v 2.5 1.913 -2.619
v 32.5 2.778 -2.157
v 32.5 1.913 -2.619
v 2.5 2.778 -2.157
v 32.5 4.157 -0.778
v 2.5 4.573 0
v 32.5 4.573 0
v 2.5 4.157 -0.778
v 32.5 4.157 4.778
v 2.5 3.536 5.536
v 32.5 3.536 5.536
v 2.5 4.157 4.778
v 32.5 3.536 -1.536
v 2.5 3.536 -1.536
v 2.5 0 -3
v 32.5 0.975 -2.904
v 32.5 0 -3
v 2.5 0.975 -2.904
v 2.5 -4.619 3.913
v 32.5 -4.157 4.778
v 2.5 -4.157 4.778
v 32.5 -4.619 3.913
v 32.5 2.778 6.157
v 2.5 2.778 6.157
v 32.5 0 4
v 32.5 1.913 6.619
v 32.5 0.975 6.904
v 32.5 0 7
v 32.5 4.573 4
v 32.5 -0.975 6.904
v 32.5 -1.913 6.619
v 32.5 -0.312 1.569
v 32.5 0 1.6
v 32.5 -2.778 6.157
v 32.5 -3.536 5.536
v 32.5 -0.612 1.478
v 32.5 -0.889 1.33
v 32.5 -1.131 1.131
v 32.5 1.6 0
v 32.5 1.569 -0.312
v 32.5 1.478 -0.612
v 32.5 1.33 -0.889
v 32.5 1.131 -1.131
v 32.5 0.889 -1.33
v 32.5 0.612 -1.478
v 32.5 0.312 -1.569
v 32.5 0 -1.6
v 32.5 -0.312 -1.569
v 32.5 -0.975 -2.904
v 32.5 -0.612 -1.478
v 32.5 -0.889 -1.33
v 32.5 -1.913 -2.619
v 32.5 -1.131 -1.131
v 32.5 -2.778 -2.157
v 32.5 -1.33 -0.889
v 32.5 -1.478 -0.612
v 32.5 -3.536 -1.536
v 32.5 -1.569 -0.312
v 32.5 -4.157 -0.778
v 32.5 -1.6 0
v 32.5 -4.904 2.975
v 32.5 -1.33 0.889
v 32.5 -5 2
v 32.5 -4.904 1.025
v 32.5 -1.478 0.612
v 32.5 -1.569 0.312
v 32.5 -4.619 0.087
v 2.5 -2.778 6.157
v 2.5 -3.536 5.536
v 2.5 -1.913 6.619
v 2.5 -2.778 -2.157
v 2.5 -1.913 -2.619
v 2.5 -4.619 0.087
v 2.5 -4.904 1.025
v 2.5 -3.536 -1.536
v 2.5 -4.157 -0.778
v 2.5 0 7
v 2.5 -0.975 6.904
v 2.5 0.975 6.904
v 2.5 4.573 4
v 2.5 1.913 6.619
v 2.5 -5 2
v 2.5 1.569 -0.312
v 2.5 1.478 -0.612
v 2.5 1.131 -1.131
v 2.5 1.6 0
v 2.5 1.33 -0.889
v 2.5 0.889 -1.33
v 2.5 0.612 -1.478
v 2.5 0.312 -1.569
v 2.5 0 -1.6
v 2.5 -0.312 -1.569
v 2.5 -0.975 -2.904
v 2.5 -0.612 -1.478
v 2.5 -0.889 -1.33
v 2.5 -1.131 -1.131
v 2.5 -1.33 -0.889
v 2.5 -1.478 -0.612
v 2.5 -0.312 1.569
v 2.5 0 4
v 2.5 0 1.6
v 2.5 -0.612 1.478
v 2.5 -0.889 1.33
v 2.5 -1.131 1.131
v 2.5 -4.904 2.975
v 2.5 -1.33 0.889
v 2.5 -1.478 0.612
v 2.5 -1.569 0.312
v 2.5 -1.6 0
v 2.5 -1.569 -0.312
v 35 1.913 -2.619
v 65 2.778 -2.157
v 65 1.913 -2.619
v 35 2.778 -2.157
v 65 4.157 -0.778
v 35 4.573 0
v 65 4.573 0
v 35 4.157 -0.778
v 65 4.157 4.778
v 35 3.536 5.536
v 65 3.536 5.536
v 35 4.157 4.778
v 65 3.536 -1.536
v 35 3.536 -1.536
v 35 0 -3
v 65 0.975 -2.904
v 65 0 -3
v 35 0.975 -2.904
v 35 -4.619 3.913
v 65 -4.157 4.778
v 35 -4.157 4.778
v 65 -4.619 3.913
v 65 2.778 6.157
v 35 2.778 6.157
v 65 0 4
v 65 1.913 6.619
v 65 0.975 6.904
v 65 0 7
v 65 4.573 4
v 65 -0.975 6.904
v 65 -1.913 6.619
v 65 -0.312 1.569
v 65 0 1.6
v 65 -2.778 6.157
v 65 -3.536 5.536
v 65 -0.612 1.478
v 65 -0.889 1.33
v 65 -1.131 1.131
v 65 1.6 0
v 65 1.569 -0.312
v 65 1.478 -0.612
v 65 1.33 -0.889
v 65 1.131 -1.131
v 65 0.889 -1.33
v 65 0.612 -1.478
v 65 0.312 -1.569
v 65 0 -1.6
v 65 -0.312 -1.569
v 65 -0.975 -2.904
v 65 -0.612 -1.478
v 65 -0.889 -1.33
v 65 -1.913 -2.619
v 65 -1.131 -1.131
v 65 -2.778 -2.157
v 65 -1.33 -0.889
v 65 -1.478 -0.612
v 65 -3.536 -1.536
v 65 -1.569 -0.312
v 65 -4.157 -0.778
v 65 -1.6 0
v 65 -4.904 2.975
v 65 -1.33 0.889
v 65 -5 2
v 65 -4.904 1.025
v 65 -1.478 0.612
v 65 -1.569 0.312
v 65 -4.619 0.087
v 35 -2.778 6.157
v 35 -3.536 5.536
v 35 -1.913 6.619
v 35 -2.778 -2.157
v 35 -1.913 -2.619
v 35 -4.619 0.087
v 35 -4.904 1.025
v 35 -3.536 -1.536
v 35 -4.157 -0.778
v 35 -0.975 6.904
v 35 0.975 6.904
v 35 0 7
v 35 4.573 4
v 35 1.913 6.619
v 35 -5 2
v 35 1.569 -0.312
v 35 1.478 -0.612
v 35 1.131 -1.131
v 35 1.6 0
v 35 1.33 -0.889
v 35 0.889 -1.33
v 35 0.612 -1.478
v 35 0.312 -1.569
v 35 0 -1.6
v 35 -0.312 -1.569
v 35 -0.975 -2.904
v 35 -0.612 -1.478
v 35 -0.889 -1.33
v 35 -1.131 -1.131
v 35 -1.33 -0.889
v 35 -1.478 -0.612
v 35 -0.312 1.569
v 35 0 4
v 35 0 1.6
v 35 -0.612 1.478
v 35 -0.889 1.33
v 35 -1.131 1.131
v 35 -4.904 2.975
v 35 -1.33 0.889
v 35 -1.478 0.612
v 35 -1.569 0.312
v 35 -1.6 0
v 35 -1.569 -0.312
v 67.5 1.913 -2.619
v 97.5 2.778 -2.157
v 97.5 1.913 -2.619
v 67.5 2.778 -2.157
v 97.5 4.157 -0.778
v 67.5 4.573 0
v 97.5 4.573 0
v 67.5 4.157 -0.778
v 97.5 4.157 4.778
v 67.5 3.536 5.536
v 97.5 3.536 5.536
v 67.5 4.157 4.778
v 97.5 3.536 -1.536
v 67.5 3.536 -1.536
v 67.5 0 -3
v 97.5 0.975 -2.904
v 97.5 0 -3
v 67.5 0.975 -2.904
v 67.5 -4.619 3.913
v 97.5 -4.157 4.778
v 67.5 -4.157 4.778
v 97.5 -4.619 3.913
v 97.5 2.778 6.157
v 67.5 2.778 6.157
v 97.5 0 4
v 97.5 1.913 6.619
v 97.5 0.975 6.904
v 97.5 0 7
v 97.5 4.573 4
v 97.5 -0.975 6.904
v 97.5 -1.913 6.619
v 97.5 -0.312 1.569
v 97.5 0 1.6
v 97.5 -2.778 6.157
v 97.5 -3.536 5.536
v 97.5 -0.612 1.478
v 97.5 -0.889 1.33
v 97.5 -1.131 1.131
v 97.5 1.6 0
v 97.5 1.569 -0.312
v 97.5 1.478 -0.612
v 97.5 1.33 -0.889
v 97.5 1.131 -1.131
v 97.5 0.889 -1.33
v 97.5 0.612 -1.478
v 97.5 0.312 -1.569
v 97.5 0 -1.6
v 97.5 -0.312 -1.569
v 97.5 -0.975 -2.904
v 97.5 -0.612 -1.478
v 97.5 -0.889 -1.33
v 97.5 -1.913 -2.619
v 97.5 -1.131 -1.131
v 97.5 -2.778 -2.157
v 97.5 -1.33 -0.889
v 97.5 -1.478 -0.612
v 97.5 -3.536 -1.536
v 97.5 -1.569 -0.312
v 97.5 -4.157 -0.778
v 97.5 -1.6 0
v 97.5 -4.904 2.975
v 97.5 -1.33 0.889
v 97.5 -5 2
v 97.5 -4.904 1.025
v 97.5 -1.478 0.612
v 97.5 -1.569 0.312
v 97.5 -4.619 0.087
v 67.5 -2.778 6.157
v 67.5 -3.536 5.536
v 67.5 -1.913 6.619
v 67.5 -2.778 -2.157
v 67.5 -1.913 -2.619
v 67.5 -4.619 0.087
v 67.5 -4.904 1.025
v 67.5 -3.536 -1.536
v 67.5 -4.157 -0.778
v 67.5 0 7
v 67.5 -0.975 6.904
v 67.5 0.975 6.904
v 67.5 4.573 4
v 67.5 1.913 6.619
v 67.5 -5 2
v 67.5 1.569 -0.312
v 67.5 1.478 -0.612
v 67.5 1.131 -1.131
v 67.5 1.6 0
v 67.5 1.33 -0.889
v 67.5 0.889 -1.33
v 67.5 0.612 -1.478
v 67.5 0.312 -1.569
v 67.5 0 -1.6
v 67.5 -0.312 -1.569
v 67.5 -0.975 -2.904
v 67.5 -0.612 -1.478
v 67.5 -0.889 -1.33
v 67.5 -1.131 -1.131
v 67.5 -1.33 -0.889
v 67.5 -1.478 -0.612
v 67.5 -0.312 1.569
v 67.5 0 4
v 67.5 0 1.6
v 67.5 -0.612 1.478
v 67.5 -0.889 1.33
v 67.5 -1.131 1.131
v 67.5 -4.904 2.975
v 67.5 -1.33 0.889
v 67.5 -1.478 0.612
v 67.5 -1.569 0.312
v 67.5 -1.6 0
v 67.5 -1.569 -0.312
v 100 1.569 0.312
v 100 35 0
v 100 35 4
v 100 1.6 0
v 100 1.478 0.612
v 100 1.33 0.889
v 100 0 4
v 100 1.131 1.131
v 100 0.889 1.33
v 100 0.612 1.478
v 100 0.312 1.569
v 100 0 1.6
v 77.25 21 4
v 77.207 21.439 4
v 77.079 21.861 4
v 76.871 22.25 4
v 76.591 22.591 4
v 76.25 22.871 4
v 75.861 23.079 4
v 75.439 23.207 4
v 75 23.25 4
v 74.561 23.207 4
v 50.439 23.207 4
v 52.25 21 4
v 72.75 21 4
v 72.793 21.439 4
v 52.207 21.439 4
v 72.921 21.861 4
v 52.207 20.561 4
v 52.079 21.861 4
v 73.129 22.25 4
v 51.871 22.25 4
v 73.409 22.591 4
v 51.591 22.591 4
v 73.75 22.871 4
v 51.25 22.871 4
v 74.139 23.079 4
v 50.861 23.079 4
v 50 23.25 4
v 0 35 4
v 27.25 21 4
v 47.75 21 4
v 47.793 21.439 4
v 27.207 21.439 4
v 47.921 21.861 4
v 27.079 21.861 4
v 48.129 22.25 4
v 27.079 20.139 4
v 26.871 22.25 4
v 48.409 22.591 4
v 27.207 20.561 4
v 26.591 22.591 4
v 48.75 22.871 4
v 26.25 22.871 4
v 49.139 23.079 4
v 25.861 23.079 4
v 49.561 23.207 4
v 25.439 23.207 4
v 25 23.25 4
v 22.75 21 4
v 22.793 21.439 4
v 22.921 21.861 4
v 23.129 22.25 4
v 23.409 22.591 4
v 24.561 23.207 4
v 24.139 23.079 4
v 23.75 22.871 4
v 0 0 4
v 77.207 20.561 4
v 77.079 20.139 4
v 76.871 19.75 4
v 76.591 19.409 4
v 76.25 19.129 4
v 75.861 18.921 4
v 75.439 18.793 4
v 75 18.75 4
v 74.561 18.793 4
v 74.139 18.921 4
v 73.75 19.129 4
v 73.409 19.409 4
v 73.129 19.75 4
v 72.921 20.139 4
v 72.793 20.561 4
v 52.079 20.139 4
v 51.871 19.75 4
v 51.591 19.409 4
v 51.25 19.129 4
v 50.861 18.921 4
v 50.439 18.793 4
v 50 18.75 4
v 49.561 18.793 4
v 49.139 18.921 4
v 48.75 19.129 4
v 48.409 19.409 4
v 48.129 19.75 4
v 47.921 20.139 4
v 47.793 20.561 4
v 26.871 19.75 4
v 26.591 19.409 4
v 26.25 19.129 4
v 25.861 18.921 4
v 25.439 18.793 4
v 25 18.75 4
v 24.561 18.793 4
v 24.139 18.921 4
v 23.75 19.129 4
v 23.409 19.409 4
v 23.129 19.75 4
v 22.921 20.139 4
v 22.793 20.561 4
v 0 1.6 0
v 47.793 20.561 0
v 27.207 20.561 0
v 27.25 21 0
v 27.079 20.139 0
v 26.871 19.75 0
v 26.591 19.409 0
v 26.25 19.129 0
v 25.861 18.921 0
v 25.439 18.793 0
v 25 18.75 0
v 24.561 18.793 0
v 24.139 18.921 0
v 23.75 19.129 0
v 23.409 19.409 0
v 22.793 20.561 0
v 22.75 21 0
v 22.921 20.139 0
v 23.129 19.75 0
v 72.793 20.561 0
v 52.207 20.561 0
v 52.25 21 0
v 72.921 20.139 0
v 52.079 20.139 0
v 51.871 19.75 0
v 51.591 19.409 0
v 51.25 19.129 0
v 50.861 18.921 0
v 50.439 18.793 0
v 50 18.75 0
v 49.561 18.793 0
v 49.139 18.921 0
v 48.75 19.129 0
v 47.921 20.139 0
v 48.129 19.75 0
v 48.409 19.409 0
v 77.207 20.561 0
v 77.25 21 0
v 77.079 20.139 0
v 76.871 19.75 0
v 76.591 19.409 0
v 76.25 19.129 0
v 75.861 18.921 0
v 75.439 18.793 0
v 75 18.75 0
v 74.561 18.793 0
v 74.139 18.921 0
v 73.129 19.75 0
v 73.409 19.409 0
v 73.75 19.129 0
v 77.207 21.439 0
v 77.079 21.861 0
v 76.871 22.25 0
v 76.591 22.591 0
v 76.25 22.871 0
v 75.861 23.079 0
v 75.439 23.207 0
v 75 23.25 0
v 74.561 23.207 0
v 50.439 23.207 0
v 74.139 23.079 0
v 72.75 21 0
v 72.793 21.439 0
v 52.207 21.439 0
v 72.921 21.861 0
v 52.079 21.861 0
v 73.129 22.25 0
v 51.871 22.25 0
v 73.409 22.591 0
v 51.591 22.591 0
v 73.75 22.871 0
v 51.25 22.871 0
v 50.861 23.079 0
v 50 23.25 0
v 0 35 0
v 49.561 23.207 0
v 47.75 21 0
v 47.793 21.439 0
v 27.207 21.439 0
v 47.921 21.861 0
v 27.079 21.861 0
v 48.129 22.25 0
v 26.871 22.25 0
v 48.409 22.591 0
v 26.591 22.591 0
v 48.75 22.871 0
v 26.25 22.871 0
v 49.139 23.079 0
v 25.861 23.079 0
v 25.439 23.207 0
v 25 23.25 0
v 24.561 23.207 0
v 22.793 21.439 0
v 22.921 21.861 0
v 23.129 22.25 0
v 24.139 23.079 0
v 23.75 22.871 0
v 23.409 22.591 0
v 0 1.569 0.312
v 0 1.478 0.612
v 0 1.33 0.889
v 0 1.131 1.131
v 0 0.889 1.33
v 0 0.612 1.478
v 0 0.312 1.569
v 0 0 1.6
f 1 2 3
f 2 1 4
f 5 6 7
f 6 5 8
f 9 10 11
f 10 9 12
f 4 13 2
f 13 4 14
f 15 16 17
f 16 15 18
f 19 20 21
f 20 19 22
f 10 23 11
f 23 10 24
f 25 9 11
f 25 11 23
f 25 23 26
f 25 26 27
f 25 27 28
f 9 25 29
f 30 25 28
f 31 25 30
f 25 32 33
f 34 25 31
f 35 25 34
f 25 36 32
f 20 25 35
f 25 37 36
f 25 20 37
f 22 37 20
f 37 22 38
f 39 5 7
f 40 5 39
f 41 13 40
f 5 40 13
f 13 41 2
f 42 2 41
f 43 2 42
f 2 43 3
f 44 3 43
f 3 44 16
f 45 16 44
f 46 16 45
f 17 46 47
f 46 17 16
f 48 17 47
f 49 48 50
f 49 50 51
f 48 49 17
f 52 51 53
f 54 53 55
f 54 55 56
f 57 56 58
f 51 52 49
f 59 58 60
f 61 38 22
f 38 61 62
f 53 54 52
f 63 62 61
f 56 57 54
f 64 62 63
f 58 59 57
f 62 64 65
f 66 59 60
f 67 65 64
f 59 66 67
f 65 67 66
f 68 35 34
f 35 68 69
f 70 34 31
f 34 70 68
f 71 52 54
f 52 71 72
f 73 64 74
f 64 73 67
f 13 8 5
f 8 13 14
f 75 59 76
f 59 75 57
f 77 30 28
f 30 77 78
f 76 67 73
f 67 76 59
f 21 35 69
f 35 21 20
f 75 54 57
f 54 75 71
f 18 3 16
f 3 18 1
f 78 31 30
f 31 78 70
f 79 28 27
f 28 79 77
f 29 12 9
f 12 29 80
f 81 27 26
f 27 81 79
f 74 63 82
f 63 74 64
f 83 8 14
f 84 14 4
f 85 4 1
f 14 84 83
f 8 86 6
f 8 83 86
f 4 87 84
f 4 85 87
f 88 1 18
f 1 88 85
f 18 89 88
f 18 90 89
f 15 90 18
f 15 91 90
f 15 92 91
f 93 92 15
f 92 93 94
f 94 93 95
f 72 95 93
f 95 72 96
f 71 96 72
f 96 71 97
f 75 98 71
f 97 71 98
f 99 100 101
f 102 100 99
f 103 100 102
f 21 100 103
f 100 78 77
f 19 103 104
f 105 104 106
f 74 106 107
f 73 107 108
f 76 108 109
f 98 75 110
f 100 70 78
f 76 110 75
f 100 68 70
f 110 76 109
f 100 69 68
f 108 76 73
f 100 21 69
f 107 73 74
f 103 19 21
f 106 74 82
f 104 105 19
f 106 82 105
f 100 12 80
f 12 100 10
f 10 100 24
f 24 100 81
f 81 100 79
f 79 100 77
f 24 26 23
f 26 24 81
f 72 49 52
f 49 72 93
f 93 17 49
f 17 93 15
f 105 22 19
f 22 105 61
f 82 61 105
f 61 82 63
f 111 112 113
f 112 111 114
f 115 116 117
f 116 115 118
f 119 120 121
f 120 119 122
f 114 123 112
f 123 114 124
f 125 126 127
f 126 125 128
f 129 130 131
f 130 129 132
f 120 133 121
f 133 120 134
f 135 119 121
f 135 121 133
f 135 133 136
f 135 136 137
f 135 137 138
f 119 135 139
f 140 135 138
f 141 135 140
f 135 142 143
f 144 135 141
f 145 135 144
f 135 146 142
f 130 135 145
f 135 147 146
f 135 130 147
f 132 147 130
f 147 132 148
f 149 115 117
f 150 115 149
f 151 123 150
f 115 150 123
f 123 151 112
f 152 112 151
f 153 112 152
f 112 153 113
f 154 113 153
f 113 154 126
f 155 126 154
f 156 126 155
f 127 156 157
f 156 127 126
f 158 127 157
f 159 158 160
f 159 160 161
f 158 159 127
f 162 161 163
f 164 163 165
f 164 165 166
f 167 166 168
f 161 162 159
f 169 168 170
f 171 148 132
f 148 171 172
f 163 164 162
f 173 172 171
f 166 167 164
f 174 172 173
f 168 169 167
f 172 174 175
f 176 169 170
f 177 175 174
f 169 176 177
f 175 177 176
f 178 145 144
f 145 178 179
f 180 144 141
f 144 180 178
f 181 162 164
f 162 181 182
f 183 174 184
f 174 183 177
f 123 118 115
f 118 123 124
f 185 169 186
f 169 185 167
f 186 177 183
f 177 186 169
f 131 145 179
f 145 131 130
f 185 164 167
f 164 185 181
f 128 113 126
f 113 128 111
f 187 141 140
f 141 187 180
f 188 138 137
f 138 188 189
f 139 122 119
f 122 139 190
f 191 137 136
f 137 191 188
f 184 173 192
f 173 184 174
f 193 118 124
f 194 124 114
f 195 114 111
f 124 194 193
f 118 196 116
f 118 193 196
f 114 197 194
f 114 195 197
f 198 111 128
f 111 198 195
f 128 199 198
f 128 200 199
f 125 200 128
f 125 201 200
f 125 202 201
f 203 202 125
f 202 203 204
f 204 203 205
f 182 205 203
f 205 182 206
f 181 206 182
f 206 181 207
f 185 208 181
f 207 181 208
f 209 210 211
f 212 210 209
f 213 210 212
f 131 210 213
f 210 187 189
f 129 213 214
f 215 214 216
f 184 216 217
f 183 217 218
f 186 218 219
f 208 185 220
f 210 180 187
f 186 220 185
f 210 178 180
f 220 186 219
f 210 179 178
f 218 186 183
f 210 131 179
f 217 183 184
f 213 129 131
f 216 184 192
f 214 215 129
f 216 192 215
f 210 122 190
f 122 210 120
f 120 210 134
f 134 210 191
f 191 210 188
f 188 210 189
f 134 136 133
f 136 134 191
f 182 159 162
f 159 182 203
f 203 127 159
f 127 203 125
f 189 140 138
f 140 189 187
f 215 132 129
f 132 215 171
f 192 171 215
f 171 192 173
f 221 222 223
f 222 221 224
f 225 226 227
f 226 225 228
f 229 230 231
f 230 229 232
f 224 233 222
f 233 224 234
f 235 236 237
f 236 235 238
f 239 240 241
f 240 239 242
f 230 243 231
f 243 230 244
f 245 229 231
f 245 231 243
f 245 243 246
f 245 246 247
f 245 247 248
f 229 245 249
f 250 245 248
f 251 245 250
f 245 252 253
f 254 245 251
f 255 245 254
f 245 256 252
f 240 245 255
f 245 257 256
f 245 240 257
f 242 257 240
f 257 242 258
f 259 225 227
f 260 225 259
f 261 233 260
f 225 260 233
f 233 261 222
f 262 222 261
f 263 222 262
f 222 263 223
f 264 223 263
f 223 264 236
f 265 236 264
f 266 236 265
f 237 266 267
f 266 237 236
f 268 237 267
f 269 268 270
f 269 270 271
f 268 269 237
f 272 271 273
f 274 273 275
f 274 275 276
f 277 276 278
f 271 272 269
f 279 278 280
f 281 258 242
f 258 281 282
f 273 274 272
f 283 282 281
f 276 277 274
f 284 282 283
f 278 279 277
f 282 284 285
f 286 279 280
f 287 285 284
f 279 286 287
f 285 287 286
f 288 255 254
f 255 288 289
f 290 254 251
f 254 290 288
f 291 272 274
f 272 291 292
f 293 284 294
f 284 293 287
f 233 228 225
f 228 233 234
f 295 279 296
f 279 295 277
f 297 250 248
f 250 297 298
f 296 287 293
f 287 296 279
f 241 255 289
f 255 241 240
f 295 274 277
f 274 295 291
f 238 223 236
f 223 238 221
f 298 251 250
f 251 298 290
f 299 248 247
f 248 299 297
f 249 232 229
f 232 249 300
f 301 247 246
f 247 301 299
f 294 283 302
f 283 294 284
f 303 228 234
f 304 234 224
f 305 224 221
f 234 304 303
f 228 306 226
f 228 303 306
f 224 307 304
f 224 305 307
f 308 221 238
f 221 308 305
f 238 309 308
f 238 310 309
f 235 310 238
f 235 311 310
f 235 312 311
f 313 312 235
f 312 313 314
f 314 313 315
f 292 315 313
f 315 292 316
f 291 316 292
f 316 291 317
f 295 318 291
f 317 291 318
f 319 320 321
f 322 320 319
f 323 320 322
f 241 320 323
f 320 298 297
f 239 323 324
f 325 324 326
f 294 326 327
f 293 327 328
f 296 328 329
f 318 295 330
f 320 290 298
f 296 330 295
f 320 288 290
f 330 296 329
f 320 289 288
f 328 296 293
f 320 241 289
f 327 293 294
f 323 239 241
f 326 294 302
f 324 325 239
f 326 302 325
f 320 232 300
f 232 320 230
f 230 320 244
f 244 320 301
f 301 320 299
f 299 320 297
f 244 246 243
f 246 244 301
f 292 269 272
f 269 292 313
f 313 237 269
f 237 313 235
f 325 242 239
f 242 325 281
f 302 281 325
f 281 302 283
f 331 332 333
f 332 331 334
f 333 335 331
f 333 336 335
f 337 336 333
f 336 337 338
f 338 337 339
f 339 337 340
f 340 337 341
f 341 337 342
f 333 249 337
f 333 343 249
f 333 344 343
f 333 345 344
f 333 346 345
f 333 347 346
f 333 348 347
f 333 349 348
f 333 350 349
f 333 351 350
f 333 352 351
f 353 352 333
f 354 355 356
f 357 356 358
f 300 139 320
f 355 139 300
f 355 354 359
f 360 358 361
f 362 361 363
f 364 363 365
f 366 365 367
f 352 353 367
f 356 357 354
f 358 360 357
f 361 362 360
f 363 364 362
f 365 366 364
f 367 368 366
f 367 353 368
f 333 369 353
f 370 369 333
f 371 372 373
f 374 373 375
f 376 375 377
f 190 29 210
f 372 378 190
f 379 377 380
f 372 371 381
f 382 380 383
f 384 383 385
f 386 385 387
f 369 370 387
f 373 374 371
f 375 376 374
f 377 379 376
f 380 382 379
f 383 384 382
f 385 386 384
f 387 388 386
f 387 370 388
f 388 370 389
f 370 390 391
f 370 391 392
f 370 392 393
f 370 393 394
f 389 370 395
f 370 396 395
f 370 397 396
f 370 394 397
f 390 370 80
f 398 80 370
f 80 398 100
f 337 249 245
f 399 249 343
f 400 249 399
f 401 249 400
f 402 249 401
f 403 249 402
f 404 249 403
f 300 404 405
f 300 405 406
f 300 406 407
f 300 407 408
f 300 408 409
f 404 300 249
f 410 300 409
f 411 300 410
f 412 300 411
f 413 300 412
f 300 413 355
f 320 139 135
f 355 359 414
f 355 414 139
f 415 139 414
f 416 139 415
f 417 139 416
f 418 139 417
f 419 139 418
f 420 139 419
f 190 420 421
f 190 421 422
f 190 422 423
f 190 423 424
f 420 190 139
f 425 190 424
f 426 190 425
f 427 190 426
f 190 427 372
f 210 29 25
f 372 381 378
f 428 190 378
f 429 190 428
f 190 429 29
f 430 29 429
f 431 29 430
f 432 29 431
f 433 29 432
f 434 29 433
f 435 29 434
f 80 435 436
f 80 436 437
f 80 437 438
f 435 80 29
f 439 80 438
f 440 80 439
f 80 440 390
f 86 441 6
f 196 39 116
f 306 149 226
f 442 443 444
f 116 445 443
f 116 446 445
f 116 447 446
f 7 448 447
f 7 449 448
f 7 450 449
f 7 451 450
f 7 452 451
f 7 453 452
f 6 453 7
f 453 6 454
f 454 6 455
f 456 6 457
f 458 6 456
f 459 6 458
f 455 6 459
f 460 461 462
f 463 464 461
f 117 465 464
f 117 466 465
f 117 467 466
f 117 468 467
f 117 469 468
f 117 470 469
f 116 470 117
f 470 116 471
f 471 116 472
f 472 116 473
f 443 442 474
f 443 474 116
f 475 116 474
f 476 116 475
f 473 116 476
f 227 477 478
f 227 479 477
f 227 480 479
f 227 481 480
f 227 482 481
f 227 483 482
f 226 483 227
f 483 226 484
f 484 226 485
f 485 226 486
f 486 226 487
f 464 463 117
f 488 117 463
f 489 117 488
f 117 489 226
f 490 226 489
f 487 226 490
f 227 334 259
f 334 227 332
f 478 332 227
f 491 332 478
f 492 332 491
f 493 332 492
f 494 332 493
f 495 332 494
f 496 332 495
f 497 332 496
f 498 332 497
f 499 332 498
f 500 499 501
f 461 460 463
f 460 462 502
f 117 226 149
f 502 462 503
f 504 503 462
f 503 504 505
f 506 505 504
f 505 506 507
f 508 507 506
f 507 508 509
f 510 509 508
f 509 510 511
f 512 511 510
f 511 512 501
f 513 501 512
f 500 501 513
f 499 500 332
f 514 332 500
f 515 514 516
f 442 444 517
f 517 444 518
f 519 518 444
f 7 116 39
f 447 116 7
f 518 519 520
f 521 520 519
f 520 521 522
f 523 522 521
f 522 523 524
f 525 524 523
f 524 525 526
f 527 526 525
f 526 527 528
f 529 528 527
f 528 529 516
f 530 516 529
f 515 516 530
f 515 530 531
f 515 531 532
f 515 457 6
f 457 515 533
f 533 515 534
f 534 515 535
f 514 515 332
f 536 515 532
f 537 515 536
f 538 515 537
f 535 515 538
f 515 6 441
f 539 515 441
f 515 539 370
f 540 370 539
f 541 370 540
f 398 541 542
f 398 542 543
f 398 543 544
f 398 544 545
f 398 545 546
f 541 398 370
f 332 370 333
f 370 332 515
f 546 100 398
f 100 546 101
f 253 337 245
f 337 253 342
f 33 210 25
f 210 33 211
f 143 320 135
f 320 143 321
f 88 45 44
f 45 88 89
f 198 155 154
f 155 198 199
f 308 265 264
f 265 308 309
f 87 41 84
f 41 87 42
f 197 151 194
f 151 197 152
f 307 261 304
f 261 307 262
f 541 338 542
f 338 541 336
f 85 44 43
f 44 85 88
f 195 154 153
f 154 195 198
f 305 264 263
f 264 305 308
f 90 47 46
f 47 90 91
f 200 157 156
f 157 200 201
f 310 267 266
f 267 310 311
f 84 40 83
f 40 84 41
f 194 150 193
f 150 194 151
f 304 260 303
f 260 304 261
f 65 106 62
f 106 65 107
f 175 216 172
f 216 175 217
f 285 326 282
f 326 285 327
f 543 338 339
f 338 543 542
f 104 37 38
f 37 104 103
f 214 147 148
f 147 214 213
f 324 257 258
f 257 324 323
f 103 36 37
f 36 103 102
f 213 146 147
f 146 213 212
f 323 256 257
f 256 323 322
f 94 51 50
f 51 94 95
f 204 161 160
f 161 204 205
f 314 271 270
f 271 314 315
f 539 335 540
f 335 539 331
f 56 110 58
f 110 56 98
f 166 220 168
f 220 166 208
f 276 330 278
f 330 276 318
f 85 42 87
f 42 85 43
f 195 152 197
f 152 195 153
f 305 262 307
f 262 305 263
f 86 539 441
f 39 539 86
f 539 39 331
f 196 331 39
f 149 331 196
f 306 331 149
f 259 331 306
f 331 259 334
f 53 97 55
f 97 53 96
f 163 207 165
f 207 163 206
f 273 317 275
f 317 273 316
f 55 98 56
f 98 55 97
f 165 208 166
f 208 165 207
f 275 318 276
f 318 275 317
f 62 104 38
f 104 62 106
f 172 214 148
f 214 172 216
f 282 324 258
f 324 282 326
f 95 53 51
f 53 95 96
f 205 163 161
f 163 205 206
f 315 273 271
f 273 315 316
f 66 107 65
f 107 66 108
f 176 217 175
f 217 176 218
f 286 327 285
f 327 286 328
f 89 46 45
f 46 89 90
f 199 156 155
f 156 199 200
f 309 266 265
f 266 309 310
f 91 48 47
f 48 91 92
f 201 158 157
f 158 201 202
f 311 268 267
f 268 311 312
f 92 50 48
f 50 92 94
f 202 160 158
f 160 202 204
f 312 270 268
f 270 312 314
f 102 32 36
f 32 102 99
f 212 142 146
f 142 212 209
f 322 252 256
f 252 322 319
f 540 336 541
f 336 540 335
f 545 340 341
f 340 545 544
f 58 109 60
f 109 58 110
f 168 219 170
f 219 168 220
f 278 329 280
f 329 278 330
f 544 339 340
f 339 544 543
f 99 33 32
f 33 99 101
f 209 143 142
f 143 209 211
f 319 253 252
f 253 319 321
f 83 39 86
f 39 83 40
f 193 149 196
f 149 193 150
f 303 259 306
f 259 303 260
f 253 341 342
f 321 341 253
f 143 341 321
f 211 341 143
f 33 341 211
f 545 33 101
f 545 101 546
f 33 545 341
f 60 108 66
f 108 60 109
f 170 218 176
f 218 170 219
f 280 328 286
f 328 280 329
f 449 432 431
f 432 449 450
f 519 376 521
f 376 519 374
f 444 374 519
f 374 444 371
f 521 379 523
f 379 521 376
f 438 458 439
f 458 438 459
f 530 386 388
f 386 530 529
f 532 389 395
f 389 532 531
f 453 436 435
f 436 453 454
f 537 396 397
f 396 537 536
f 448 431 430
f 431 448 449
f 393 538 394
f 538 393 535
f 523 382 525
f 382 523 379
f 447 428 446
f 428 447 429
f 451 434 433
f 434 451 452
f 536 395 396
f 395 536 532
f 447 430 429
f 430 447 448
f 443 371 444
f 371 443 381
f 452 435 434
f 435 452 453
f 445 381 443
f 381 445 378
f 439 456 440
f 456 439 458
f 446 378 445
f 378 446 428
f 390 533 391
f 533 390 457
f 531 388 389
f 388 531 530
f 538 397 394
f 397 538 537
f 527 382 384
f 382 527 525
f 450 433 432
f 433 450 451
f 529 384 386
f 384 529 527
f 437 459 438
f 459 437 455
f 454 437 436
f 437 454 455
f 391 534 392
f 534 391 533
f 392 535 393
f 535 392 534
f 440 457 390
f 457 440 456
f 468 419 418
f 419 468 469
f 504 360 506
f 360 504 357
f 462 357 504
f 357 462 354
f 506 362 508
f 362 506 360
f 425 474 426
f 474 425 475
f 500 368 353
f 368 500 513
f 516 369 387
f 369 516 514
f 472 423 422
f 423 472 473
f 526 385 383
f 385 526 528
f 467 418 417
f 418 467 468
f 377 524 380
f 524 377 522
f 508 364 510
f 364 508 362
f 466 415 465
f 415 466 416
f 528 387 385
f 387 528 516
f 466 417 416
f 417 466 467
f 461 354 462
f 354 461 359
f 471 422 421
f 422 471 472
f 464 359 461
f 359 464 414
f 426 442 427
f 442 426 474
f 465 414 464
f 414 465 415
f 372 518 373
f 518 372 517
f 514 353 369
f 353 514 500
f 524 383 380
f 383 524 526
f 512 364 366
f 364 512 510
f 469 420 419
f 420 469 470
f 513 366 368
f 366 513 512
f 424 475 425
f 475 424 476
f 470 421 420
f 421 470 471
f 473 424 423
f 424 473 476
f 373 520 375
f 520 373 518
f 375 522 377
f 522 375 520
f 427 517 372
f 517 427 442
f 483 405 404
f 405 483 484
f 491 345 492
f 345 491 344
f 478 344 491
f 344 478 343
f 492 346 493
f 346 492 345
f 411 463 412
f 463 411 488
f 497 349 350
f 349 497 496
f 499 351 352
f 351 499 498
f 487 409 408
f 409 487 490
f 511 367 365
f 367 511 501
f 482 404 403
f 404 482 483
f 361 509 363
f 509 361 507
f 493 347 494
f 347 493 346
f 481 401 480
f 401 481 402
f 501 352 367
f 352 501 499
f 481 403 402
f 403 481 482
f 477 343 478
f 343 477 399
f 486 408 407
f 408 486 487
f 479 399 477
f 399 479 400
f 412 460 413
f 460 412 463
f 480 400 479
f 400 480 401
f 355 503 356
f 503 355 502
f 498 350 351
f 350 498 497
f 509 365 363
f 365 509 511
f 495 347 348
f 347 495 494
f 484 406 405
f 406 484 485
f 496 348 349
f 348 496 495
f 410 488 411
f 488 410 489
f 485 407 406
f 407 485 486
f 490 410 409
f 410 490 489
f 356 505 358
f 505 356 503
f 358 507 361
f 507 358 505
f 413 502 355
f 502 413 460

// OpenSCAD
$fn = 32;

// ----------------------------------------------------------------------
// Hinge leaf: 100 x 40 x 10 mm
// ----------------------------------------------------------------------

// --- parameters (mm) ---
tab_len = 100;            // leaf length, X
tab_w = 35;               // leaf width, Y
tab_t = 4;                // leaf thickness
ring_d = 10;              // knuckle diameter
ring_w = 30;              // knuckle width
knuckle_n = 3;            // number of knuckles
pin_d = 3.2;              // pin bore
gap = 2.5;                // gap between the knuckles
screw_d = 4.5;            // screw clearance

module leaf() {
  cube([tab_len, tab_w, tab_t]);
}

module knuckles() {
  /* barrels sit on the leaf edge, the pin axis at half the leaf thickness */
  for (i = [0 : knuckle_n - 1])
    translate([gap + i * (ring_w + gap), 0, tab_t * 0.5])
      rotate([0, 90, 0]) cylinder(h = ring_w, d = ring_d);
}

difference() {
  union() {
    leaf();
    knuckles();
  }
  rotate([0, 90, 0]) translate([0, 0, -1])
    cylinder(h = tab_len + 2, d = pin_d);
  translate([25, tab_w * 0.6, -1]) cylinder(h = tab_t + 2, d = screw_d);
  translate([50, tab_w * 0.6, -1]) cylinder(h = tab_t + 2, d = screw_d);
  translate([75, tab_w * 0.6, -1]) cylinder(h = tab_t + 2, d = screw_d);
}
